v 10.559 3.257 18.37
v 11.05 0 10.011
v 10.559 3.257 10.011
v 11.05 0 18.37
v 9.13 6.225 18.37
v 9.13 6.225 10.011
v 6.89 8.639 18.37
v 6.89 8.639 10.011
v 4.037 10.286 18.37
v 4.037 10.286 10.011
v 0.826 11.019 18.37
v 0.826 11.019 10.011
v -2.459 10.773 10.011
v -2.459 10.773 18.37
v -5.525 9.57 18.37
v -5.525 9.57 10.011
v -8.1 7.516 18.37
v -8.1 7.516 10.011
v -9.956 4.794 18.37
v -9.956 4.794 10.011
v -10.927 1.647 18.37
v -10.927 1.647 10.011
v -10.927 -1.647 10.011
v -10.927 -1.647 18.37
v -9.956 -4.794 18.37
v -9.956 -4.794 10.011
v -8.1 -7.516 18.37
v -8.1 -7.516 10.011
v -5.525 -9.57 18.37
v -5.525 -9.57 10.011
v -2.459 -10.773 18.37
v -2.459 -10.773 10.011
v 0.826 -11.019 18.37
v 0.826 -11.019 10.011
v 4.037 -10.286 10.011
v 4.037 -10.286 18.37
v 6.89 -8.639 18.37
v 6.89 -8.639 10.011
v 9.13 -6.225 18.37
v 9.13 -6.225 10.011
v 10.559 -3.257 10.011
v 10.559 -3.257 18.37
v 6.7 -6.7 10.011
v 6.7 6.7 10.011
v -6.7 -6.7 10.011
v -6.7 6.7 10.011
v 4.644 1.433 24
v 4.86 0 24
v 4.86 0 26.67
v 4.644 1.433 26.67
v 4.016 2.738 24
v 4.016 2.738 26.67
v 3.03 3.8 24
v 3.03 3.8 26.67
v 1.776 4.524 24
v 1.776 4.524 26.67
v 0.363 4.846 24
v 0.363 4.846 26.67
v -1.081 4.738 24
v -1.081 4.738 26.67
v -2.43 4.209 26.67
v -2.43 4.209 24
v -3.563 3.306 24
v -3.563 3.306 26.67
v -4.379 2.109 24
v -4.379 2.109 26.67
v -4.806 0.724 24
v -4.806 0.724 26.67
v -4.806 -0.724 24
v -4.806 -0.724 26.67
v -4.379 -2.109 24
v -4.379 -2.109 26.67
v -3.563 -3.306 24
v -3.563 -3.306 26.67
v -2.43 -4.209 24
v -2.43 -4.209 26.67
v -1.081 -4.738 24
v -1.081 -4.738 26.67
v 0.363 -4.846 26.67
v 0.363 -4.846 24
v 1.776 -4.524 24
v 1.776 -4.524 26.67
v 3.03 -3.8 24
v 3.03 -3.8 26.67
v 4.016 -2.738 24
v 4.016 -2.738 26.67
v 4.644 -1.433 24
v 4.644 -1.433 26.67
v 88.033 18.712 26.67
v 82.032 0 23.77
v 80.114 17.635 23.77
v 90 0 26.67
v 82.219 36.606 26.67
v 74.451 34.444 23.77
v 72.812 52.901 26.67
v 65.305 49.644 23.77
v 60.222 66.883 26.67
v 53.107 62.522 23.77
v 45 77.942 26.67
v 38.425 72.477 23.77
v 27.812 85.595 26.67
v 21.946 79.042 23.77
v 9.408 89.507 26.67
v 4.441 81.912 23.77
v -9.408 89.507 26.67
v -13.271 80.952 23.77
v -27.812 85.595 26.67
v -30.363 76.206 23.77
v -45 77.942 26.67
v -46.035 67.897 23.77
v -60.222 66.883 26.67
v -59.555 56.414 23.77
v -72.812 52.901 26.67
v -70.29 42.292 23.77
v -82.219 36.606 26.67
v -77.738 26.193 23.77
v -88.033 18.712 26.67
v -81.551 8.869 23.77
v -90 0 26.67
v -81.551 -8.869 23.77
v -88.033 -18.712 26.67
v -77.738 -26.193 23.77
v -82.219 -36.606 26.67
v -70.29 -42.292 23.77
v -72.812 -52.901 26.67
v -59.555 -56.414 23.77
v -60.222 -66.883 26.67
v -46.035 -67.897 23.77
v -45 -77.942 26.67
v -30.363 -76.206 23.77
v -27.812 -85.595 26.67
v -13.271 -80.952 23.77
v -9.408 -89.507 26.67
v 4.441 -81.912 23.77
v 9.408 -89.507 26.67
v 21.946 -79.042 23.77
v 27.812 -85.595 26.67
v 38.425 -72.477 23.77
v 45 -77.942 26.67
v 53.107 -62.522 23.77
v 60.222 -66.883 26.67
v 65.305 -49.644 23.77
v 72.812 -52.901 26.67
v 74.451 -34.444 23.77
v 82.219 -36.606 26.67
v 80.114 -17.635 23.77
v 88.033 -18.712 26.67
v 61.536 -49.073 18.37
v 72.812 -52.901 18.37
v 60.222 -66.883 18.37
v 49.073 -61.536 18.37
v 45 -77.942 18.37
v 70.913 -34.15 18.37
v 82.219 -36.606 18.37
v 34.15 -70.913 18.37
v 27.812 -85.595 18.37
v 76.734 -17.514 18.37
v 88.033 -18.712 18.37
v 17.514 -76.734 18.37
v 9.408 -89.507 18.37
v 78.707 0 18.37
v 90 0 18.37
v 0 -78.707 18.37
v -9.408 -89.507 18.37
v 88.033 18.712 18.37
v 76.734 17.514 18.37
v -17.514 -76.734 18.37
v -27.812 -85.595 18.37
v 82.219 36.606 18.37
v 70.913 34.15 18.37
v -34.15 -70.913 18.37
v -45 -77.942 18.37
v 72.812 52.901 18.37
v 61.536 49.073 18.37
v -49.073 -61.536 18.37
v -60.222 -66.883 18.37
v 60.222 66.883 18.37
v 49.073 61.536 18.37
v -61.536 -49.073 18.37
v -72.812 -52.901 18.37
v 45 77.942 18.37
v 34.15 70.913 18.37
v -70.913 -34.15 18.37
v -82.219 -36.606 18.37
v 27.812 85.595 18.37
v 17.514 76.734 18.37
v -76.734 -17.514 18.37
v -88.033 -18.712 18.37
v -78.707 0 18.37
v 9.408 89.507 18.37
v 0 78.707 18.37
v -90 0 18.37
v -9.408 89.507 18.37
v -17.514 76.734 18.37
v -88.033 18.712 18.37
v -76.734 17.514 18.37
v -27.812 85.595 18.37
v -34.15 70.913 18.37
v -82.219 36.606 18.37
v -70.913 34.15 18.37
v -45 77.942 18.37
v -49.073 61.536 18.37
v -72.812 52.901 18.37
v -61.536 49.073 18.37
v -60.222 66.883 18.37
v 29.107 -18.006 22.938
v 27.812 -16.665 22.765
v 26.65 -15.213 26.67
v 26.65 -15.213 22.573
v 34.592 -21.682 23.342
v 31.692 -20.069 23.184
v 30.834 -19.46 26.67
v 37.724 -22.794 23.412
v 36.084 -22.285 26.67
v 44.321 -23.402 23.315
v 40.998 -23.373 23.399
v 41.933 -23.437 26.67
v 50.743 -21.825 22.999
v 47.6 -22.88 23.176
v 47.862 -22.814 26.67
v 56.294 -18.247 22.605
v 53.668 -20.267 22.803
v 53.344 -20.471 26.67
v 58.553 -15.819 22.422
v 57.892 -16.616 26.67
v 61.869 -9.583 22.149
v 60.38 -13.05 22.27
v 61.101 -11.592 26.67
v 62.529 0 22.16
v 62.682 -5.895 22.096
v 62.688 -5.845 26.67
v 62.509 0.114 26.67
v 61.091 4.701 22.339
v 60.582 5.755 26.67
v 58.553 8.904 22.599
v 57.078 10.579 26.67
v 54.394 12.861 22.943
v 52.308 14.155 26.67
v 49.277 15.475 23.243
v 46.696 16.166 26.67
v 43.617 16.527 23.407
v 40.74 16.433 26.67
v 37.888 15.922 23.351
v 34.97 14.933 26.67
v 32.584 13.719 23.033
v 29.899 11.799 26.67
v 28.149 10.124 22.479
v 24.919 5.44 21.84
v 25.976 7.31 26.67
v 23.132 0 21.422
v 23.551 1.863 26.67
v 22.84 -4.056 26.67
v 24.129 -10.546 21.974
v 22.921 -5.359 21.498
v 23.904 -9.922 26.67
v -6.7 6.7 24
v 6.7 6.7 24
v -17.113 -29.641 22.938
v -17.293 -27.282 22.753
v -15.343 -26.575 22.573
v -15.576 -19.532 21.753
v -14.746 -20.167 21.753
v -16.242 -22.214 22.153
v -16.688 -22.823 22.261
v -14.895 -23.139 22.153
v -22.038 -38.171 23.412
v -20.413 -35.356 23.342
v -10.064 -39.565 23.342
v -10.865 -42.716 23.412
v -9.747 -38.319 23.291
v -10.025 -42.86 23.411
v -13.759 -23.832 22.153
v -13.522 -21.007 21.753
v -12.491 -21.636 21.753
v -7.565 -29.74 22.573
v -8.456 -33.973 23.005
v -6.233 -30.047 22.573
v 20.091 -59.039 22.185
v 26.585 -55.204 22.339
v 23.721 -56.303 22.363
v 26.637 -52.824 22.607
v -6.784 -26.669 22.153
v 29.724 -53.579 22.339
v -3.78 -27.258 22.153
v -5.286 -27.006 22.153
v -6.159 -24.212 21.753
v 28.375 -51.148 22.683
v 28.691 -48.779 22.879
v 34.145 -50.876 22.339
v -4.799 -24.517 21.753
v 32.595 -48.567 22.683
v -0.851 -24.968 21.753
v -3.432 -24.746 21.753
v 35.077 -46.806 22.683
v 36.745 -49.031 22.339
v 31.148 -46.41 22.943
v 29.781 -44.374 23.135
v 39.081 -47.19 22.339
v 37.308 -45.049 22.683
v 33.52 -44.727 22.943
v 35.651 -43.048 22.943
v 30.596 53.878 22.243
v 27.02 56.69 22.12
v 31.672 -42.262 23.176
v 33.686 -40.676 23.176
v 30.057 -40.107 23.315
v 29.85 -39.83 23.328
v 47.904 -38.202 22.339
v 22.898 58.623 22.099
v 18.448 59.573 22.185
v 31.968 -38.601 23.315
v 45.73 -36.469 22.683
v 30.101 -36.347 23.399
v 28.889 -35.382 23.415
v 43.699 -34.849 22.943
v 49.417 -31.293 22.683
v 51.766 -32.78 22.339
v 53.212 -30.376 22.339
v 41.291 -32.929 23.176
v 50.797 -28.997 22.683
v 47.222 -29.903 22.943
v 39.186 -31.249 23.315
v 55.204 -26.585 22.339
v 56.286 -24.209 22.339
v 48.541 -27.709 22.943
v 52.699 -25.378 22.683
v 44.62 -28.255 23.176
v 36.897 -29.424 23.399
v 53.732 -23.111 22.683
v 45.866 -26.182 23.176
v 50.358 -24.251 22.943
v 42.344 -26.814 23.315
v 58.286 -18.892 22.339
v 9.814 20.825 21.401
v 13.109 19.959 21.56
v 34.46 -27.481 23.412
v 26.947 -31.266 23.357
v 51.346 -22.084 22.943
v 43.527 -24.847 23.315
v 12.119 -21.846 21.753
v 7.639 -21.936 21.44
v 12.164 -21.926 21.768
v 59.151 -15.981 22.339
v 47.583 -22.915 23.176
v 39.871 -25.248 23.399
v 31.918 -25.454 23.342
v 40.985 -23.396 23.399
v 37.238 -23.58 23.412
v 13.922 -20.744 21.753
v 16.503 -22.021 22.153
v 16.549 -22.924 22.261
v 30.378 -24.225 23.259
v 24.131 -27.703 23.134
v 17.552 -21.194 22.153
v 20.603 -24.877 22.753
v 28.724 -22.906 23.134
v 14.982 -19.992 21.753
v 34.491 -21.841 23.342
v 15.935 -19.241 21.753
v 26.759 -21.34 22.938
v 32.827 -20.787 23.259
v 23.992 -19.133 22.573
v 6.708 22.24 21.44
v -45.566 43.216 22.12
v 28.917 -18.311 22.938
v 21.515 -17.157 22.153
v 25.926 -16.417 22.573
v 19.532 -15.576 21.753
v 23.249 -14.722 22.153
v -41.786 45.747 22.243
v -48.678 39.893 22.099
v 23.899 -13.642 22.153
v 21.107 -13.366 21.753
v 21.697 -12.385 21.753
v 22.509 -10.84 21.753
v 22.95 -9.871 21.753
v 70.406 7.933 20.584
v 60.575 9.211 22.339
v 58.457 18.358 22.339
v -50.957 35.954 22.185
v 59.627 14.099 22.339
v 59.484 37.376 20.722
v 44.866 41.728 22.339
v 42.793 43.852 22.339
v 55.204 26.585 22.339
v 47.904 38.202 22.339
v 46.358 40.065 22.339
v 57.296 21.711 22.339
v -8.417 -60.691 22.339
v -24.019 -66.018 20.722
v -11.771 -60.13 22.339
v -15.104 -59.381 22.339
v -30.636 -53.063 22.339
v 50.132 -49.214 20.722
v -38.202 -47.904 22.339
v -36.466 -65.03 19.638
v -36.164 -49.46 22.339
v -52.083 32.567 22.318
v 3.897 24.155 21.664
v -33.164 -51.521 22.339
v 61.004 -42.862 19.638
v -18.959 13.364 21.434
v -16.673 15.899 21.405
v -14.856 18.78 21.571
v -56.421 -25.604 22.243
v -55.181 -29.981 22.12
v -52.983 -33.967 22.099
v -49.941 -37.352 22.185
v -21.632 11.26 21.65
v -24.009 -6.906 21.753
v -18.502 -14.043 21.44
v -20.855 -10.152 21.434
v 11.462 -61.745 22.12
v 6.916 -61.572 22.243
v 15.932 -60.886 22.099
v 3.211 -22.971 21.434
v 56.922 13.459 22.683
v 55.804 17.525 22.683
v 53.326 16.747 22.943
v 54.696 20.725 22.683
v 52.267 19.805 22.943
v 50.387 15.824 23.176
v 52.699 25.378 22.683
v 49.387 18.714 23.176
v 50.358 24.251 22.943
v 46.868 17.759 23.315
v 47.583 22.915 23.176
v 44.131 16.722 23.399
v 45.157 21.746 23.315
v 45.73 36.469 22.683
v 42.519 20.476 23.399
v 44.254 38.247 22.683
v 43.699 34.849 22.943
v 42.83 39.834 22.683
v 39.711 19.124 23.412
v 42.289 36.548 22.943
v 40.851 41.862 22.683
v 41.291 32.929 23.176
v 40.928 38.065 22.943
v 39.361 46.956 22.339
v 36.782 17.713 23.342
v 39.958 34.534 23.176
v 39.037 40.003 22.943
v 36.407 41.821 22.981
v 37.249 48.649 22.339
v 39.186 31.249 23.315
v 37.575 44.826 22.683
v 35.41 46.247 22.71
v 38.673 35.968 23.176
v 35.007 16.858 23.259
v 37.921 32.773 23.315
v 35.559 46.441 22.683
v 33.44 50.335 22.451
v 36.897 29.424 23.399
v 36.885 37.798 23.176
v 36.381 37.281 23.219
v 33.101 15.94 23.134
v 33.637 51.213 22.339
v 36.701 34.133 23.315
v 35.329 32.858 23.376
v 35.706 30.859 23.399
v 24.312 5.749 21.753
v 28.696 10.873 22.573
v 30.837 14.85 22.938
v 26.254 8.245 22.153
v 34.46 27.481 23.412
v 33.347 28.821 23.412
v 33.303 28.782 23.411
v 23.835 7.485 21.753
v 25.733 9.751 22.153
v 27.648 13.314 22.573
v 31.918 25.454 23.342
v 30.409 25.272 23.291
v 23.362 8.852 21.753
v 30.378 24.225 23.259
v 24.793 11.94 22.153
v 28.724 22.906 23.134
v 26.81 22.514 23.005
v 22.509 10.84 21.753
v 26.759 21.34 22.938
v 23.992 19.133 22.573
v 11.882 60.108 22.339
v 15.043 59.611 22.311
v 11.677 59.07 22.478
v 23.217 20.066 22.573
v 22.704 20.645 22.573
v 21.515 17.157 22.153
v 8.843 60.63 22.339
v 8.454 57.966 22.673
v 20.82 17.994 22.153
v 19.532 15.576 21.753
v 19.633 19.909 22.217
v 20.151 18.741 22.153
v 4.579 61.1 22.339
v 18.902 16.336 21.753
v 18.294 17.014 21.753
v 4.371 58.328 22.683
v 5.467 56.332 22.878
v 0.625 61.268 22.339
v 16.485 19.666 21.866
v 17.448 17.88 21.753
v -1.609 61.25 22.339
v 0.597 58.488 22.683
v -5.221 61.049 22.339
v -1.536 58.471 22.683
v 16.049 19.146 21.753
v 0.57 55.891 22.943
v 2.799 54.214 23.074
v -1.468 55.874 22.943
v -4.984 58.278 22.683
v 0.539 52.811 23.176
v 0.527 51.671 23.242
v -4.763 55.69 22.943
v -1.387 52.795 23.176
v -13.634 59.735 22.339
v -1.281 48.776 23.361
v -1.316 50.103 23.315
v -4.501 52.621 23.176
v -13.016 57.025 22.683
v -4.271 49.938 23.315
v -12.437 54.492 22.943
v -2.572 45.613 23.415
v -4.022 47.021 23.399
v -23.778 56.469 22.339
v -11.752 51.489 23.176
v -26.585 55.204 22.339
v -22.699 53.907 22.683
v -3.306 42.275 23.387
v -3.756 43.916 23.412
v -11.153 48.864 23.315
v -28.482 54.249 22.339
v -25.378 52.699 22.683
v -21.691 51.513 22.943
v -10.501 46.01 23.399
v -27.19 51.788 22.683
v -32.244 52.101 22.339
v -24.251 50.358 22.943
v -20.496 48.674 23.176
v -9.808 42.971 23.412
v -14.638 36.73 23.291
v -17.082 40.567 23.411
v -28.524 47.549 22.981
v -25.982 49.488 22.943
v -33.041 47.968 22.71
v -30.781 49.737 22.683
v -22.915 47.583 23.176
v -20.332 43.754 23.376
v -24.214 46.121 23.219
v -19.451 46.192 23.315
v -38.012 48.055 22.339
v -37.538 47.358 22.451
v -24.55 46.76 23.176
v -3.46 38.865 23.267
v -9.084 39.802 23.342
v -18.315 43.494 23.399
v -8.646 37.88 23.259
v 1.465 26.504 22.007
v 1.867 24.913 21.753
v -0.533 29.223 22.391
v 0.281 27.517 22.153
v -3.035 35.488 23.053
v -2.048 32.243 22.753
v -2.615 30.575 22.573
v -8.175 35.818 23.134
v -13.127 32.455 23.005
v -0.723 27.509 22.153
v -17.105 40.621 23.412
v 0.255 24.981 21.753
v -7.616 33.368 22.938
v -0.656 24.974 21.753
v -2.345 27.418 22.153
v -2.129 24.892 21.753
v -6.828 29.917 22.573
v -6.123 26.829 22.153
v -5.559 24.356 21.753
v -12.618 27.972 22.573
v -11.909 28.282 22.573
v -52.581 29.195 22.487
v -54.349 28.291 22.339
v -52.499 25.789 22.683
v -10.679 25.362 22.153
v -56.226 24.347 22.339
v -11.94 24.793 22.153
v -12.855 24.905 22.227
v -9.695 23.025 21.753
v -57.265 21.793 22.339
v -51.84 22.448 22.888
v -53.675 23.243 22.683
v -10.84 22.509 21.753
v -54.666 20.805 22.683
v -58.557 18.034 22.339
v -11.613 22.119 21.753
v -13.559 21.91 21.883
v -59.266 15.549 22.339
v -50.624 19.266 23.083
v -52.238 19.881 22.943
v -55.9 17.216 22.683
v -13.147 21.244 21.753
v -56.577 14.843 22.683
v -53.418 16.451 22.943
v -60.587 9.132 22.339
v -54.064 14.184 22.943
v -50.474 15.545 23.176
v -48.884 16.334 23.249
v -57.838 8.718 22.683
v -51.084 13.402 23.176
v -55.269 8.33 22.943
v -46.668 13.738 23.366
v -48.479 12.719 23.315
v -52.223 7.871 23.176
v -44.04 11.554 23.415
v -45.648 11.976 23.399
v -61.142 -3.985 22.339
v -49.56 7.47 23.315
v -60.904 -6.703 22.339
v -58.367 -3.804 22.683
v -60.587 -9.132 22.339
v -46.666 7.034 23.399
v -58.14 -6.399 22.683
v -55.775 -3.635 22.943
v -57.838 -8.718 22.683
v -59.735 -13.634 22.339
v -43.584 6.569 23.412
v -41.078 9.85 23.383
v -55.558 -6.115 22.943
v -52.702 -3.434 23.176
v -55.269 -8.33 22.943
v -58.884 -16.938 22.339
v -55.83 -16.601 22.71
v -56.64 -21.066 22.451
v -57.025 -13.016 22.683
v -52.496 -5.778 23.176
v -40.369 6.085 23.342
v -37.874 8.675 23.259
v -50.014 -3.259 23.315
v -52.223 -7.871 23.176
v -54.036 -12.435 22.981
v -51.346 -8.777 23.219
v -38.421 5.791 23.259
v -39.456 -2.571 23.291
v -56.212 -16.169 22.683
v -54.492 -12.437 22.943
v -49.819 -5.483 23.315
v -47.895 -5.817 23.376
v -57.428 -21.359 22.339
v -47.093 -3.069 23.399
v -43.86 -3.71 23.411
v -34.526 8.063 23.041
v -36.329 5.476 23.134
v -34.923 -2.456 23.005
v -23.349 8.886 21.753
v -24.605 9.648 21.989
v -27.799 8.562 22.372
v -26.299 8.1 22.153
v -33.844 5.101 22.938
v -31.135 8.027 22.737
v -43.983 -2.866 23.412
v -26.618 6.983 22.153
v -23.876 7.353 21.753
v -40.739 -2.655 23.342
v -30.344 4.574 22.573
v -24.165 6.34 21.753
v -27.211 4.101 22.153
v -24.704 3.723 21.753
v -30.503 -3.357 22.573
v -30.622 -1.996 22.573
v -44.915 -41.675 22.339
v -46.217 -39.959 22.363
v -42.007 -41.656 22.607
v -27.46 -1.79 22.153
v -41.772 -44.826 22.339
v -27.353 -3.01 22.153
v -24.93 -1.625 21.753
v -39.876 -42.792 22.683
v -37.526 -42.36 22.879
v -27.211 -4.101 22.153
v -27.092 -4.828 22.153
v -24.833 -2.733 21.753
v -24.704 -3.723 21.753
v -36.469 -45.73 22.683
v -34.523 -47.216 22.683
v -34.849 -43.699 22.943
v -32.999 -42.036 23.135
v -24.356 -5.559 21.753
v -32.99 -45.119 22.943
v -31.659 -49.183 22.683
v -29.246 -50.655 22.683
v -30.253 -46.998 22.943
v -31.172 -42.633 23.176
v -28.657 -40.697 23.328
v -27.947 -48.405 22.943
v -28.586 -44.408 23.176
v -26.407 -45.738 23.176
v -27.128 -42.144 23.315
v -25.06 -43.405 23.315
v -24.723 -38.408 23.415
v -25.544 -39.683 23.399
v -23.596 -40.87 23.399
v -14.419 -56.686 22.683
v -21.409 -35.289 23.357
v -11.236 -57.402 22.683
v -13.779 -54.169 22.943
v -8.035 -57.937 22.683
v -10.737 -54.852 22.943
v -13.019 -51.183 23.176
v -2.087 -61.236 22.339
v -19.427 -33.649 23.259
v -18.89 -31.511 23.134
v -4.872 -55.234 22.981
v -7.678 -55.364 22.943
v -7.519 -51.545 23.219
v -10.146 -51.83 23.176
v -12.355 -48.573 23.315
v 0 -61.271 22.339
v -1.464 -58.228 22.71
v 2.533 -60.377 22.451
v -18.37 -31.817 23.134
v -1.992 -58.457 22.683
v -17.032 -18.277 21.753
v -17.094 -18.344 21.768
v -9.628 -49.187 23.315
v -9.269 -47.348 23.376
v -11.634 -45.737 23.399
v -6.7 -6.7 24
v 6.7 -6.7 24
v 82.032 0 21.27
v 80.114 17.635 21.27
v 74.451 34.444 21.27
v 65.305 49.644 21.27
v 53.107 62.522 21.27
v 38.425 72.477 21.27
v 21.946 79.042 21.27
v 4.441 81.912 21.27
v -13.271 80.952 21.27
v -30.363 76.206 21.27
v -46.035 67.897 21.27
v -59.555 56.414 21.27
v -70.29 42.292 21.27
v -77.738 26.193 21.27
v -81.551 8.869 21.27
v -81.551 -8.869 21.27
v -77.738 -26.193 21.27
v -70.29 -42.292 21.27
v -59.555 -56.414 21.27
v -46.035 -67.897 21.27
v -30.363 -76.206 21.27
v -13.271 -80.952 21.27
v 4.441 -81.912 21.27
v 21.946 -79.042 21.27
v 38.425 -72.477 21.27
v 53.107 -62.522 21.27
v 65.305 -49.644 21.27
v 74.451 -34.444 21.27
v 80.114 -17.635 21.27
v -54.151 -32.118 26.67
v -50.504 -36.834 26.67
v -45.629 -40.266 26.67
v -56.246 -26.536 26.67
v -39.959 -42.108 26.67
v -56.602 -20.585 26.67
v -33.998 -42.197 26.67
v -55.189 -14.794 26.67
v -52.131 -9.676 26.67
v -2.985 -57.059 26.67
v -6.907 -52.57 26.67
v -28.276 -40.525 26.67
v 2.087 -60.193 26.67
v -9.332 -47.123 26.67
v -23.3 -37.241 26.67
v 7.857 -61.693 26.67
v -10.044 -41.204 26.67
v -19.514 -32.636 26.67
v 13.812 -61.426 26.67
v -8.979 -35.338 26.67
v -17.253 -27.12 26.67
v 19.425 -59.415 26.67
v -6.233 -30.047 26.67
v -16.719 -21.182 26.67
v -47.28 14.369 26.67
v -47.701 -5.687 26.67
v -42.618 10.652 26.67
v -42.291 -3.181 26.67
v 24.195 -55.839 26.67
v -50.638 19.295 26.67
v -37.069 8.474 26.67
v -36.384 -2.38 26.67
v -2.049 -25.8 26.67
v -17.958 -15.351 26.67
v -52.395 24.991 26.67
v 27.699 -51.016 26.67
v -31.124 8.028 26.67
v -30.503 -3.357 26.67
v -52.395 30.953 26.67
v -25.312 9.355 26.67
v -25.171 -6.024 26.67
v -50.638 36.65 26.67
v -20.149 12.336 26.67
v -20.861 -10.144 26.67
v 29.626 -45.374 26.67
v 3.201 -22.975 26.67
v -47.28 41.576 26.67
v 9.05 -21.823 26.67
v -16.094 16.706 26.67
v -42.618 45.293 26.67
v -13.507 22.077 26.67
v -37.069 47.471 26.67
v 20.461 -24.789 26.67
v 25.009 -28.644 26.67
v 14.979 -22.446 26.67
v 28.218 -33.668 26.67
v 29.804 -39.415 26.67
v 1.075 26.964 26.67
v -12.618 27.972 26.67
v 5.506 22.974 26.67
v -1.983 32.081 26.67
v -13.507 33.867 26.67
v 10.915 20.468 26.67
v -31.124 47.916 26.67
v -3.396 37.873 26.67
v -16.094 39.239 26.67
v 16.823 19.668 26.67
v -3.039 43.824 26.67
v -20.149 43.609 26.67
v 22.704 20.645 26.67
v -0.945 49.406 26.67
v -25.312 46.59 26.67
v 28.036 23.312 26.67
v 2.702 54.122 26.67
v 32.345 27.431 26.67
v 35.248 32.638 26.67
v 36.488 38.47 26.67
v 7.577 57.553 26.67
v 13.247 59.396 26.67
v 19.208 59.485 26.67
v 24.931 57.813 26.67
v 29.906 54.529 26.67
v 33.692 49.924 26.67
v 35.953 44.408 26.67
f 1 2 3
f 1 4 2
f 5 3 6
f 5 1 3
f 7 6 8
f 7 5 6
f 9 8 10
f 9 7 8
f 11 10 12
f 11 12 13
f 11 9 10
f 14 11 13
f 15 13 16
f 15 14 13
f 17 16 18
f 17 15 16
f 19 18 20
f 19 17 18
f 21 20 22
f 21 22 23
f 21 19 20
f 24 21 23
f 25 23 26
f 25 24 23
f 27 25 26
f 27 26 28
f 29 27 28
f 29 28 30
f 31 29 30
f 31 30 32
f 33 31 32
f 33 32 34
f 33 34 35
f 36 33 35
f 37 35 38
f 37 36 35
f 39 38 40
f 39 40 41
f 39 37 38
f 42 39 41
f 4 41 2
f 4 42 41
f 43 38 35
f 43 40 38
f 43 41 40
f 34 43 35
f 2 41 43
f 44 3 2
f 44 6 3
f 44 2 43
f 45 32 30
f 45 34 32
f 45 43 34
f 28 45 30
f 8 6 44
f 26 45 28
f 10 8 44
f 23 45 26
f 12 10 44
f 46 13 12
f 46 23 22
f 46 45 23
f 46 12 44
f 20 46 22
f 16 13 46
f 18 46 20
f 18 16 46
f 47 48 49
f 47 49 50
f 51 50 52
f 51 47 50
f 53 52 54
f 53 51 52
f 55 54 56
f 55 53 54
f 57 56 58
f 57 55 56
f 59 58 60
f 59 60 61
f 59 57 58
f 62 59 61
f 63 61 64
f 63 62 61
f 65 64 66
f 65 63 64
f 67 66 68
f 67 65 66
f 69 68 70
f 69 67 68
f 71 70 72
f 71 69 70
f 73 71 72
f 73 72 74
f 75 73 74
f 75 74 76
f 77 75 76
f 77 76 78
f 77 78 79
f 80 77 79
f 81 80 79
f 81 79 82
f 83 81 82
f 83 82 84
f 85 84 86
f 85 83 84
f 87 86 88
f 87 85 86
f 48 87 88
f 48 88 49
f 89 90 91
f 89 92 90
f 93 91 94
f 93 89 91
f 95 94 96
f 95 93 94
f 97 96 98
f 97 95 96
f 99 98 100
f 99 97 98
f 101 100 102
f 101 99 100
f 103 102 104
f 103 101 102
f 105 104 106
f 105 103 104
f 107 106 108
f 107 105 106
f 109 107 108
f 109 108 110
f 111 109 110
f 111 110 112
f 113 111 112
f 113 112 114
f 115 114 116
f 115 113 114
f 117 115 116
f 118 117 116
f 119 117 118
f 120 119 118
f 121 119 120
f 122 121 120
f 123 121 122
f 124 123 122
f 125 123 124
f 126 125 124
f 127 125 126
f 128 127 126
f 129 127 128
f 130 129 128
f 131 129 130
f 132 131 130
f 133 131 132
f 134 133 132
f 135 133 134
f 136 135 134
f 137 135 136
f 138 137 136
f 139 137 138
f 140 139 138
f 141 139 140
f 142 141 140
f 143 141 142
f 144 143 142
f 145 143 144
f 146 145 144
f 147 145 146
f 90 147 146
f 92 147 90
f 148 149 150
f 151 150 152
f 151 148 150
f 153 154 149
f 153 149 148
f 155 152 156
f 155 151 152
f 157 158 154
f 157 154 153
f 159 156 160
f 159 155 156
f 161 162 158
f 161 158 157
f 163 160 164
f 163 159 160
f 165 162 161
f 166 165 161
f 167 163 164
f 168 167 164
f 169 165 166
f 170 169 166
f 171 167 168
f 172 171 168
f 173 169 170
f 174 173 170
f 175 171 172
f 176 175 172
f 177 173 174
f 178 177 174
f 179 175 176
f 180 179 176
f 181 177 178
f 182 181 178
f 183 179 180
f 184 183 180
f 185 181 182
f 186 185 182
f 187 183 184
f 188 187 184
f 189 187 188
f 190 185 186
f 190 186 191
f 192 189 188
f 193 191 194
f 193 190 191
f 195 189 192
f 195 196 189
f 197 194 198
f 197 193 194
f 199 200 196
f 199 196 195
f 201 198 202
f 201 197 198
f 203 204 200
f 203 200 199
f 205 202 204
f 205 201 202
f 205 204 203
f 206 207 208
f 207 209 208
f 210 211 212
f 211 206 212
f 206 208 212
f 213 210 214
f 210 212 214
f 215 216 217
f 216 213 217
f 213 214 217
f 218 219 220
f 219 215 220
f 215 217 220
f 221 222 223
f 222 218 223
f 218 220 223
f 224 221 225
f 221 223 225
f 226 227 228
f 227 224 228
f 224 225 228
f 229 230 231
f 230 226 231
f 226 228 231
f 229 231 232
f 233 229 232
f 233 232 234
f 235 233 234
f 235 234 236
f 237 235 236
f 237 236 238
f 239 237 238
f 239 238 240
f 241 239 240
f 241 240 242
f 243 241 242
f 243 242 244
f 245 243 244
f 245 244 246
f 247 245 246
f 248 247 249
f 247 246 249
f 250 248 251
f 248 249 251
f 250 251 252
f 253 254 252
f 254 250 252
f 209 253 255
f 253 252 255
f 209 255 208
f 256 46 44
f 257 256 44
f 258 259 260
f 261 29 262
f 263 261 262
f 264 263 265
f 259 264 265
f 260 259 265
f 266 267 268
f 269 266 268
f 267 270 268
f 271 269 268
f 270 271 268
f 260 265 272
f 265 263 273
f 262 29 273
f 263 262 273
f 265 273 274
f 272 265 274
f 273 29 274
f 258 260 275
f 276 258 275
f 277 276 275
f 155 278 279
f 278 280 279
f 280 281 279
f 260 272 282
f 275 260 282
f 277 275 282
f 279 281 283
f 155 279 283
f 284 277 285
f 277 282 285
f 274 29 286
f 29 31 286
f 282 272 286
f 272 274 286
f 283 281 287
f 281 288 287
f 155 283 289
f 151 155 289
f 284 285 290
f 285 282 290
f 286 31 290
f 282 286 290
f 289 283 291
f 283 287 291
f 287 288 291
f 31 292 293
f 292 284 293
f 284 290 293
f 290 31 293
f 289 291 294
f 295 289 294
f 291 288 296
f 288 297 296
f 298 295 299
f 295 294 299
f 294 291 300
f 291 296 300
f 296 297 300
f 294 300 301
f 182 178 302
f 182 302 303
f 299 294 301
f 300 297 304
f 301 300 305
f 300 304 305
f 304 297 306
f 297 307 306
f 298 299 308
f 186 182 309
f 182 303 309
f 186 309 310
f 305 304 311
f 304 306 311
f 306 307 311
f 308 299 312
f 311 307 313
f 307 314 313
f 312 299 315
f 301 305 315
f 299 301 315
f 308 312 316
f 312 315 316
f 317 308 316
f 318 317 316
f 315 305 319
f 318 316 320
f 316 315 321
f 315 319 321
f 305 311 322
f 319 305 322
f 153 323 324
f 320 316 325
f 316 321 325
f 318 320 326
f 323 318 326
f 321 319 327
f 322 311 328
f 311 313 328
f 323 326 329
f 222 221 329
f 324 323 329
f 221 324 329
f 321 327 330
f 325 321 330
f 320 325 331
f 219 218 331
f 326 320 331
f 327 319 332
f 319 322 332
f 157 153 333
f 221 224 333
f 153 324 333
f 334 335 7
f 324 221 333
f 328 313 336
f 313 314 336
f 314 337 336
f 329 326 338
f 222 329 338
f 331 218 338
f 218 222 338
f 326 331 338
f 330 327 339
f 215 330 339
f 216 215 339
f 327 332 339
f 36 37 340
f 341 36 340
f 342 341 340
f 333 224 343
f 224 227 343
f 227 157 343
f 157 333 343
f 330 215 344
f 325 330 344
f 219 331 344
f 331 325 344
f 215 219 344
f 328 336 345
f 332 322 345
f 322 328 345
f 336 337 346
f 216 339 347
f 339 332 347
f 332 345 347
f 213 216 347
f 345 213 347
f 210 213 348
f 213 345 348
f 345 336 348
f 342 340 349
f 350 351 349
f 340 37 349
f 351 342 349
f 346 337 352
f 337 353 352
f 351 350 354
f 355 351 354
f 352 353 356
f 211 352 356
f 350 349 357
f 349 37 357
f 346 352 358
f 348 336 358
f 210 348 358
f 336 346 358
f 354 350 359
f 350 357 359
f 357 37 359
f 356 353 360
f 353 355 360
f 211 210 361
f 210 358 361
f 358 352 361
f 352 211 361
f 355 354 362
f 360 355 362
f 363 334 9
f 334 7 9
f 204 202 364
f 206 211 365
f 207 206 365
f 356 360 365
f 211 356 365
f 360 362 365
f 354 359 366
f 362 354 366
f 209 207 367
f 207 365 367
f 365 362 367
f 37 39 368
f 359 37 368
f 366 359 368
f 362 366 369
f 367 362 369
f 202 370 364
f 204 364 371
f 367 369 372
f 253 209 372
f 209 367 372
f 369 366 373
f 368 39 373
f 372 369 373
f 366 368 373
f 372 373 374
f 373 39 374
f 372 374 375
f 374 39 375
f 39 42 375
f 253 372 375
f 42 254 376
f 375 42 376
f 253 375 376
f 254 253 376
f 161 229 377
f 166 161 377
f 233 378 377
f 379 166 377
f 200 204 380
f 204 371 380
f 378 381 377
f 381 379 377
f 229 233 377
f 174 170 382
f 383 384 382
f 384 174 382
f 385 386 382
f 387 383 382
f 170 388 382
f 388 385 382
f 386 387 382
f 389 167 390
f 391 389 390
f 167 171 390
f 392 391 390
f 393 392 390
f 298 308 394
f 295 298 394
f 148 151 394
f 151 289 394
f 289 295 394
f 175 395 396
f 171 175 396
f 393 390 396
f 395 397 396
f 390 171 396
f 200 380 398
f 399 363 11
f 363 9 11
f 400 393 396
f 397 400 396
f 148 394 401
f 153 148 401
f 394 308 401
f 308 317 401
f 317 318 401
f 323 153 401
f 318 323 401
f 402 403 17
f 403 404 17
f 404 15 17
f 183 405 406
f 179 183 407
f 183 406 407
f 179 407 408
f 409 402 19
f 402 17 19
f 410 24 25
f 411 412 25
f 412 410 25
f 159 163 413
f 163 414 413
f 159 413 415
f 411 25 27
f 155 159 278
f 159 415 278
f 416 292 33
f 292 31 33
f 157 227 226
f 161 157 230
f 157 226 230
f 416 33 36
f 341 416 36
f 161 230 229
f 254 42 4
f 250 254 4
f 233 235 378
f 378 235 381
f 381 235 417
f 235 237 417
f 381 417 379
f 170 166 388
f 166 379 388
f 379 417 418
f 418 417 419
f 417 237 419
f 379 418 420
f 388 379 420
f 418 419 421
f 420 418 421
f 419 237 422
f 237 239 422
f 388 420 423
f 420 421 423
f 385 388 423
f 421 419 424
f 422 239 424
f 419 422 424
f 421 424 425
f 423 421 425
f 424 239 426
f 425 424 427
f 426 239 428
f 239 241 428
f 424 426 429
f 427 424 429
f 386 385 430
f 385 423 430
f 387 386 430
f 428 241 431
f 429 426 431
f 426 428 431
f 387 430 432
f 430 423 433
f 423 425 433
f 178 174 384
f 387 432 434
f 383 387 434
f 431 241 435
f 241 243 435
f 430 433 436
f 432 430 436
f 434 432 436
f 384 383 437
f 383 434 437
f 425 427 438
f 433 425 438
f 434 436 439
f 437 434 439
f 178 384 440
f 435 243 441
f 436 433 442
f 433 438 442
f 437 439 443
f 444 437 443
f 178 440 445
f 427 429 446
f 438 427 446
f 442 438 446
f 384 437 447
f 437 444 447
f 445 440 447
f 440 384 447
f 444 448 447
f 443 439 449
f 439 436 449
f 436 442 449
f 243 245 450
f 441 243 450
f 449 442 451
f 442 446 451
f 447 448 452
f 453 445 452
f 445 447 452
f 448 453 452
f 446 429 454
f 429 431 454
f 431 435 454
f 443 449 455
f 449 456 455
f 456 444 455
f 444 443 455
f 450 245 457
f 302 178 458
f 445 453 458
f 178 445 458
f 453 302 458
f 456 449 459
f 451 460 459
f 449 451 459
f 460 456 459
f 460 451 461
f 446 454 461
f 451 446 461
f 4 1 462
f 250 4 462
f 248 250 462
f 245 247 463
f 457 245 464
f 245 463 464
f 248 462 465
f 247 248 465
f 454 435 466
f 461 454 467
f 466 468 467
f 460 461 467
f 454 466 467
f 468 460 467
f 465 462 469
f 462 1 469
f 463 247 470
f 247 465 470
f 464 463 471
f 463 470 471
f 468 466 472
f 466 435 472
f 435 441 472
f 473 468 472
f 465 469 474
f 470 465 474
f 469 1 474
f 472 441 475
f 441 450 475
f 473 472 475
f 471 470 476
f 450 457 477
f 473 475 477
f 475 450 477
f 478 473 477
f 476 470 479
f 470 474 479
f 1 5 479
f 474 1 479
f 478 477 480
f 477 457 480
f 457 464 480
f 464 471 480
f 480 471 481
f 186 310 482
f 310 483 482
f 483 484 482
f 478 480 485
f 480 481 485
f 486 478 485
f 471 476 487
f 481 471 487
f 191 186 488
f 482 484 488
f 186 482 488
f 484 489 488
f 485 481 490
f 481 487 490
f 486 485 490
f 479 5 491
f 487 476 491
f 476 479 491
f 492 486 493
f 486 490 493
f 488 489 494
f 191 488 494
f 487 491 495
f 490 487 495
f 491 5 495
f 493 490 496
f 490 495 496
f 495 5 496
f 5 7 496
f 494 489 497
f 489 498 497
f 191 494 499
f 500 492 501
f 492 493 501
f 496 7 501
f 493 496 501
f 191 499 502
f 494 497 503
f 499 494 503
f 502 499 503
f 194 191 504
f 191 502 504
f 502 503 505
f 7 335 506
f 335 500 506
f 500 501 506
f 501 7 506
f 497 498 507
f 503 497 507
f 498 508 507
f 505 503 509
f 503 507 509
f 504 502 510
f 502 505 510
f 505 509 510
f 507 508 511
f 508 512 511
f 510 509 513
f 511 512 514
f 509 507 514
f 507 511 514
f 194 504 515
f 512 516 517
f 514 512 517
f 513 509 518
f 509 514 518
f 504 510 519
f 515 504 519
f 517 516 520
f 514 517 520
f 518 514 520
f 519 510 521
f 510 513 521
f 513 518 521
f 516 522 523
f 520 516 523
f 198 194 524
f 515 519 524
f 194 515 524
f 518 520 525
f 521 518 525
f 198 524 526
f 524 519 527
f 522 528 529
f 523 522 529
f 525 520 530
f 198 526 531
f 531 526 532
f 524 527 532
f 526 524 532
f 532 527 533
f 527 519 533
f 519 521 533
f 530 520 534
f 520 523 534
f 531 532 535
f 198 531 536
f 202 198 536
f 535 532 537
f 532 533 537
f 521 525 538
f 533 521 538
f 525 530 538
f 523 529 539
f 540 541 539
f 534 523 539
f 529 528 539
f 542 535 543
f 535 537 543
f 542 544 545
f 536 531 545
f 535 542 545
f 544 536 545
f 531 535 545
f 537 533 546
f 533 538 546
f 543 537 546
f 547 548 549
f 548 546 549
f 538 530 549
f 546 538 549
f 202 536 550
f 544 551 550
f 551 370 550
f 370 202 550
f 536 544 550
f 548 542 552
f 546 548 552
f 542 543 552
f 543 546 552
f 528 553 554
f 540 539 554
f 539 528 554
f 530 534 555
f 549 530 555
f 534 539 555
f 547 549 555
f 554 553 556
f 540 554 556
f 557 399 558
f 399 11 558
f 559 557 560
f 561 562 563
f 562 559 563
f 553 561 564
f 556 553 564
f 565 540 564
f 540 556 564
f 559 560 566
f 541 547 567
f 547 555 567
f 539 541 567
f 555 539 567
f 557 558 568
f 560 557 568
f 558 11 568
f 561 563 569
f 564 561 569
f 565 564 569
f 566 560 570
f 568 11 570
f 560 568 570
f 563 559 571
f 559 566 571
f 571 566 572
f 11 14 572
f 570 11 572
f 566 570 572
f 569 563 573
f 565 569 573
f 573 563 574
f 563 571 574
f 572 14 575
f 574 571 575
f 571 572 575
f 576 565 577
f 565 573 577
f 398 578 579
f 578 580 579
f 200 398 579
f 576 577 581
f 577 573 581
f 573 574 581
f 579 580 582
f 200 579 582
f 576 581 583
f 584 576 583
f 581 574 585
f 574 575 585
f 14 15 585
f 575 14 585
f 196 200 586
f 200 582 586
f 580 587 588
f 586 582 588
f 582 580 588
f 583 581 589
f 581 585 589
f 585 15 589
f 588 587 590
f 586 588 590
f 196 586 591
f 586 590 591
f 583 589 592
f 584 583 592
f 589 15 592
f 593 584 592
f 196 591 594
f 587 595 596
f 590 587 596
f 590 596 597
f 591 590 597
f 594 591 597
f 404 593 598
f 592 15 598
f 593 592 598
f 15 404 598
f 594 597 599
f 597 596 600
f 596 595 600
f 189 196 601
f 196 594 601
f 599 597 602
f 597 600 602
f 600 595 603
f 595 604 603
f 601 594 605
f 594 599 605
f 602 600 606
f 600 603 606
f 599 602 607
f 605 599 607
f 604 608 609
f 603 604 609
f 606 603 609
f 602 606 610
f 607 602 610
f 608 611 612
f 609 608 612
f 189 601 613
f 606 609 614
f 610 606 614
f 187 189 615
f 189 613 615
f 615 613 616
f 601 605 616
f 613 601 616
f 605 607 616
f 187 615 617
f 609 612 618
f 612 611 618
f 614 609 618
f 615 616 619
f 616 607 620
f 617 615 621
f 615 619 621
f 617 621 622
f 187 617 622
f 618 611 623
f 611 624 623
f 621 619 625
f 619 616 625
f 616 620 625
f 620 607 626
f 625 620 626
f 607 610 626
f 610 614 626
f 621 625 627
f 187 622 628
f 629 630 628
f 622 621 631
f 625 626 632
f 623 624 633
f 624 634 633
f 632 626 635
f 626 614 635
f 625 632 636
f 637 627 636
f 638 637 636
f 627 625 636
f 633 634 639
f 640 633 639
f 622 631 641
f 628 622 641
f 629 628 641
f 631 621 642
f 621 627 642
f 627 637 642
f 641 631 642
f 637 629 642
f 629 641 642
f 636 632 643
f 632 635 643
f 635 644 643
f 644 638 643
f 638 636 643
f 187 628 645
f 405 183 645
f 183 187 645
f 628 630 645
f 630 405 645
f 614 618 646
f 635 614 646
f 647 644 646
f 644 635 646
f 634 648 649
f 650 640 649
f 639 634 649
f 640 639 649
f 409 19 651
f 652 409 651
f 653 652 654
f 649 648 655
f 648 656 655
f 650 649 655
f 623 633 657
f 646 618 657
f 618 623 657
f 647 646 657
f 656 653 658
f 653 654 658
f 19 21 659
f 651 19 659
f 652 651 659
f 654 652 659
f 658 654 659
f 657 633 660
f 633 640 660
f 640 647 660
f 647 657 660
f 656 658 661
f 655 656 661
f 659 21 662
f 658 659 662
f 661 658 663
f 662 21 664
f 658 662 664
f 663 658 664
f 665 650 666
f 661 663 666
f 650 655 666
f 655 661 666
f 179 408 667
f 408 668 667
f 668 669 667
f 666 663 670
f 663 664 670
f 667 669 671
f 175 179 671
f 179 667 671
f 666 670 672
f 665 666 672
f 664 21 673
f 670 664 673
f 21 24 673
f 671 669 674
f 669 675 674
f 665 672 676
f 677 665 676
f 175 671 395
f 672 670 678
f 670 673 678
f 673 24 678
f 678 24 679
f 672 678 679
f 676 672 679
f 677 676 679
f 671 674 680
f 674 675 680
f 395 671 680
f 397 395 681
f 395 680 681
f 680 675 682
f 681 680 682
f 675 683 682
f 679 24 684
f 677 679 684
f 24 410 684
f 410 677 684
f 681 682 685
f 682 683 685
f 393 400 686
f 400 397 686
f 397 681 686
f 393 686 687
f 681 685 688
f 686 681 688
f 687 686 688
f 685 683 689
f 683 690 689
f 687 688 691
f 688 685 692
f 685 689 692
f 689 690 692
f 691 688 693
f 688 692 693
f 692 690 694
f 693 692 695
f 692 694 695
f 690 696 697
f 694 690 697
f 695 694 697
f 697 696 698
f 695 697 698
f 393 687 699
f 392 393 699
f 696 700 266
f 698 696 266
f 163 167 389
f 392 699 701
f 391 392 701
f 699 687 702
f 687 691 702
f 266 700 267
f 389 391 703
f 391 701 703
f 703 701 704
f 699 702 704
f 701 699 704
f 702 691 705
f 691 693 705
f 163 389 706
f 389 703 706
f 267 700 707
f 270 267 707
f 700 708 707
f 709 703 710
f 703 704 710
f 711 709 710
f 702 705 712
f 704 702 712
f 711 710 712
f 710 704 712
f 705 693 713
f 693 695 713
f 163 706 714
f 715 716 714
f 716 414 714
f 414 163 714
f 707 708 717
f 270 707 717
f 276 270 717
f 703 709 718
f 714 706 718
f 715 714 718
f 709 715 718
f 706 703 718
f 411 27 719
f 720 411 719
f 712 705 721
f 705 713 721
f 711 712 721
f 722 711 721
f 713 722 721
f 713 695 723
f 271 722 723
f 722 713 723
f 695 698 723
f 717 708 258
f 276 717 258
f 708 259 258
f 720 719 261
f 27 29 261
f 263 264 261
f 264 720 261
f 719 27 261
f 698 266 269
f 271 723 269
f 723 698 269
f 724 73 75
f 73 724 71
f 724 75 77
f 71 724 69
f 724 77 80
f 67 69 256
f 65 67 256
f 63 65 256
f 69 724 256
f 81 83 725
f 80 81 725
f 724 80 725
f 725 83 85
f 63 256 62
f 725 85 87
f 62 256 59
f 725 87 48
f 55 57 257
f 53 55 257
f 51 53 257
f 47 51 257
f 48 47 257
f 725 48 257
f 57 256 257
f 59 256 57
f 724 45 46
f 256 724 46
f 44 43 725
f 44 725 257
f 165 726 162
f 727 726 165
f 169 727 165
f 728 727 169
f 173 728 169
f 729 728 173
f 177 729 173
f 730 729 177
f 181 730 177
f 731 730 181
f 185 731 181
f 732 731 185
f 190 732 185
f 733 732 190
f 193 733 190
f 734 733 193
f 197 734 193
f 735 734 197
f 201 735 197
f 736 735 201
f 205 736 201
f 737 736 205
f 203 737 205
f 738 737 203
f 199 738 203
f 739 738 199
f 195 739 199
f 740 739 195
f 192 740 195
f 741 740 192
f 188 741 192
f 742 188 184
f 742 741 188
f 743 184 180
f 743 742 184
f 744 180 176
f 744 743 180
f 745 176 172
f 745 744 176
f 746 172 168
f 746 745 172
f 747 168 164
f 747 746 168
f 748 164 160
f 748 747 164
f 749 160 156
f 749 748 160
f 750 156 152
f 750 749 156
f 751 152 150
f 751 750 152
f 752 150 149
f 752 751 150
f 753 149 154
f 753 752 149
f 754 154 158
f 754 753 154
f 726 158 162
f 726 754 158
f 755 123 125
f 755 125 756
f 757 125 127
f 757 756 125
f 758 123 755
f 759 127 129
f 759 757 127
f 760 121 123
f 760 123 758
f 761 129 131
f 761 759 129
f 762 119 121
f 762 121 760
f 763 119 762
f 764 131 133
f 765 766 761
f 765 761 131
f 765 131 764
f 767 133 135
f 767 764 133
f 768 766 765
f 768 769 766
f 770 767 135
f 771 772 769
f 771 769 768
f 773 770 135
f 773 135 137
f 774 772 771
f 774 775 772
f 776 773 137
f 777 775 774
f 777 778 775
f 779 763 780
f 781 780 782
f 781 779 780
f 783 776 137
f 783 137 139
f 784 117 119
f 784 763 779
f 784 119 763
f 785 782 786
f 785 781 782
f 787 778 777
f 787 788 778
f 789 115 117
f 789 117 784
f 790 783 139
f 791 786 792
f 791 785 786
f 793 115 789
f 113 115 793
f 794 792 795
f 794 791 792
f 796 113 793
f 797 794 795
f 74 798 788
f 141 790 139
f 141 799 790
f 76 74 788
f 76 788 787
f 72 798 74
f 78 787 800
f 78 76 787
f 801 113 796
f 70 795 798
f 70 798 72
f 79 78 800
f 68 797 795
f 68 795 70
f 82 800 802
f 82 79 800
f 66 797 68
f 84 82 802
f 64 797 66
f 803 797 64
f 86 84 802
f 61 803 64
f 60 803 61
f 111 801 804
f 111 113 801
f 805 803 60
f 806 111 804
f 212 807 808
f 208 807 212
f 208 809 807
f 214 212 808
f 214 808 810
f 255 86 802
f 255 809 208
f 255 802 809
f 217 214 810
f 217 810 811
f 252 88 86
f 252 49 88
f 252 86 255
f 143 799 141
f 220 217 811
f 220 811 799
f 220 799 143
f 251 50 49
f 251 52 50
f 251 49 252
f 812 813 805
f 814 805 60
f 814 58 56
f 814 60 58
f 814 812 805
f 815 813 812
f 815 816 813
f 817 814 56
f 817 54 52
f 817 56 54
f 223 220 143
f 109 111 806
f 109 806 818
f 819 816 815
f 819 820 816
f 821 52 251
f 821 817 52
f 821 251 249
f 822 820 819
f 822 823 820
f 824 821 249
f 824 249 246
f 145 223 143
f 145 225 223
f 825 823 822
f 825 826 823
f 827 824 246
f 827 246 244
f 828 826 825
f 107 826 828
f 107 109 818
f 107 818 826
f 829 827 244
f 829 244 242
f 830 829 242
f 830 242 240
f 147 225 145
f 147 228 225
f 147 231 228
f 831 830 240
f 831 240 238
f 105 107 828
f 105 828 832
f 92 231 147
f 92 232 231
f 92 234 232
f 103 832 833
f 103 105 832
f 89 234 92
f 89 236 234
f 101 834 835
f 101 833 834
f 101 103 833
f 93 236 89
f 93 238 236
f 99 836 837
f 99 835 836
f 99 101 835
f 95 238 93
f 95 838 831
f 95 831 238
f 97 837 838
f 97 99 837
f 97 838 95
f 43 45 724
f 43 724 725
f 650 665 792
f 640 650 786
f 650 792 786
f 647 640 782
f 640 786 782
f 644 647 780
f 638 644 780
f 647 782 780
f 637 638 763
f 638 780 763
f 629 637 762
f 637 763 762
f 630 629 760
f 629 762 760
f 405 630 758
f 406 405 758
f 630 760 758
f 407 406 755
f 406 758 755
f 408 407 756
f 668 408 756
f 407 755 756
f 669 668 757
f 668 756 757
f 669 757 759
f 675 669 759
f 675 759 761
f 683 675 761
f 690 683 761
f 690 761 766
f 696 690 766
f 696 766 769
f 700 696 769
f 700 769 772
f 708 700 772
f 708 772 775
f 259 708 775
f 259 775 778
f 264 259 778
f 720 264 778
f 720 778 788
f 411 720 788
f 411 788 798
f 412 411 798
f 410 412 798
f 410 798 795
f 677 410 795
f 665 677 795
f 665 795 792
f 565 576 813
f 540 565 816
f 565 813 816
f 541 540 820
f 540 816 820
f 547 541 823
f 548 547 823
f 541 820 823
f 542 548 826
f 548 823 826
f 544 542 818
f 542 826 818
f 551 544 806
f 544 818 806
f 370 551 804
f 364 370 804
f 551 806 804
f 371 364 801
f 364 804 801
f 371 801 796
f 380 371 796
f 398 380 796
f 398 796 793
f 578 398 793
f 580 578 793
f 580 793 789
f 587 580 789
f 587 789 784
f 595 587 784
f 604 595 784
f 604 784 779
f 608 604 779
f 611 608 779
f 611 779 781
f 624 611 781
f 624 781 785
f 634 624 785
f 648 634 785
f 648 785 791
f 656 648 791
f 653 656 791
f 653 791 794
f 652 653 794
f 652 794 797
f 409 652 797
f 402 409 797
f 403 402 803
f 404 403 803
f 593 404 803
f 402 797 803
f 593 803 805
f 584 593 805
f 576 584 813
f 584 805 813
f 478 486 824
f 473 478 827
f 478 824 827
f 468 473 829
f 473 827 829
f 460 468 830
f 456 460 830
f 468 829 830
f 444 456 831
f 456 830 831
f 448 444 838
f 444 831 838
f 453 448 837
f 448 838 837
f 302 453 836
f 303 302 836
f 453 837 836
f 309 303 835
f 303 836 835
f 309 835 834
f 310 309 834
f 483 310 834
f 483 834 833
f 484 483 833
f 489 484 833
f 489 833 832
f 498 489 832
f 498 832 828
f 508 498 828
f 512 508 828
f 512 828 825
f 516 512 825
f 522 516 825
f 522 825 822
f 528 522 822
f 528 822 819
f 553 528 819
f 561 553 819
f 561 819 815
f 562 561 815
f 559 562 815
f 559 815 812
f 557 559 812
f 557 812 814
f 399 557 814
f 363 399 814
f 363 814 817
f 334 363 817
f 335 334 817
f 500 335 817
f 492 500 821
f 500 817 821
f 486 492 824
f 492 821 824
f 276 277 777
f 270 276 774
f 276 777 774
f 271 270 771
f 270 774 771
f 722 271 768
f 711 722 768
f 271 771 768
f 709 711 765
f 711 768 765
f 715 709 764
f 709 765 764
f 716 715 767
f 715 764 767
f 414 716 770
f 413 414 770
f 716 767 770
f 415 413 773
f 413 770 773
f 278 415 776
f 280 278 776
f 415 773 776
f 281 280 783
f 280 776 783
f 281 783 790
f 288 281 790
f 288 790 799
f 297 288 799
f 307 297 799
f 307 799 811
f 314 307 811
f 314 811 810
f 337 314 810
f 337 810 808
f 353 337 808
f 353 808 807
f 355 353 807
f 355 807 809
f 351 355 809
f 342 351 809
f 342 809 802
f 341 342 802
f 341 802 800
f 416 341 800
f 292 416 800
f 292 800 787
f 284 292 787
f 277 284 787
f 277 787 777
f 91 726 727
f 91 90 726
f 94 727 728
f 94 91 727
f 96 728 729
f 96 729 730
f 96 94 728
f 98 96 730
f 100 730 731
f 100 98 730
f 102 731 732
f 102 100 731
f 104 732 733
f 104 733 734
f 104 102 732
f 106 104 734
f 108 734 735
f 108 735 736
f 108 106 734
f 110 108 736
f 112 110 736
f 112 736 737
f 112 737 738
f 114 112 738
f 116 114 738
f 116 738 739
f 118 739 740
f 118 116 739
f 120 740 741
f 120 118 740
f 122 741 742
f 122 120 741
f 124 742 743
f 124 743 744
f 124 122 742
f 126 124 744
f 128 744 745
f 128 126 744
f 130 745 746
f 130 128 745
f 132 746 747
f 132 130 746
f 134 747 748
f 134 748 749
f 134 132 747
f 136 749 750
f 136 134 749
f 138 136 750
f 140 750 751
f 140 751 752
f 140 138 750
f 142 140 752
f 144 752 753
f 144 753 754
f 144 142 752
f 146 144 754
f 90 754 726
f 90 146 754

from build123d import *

# Parameters (mm, degrees)
BOX_W              = 13.4
BOX_H              = 13.4
BOX_DEPTH          = 14
SKETCH001_R        = 20
POCKET_DEPTH       = 6
POLARPATTERN_COUNT = 5


with BuildPart() as cube:
    # Box → Box (new body)
    with BuildSketch(Plane(origin=(-6.7, -6.7, 10), x_dir=(1, 0, 0), z_dir=(0, 0, 1))):
        with Locations((6.7, 6.7)):
            Rectangle(BOX_W, BOX_H)
    extrude(amount=BOX_DEPTH)


with BuildPart() as body:
    # Sketch → Revolve (revolve)
    with BuildSketch(Plane.XZ):
        with BuildLine():
            Line((78.70723, 18.37), (90, 18.37))
            Line((90, 18.37), (82.032315, 21.27))
            Line((82.032315, 21.27), (82.032315, 23.77))
            Line((82.032315, 23.77), (90, 26.67))
            Line((90, 26.67), (4.86, 26.67))
            Line((4.86, 26.67), (4.86, 10.010664))
            Line((4.86, 10.010664), (11.05, 10.010664))
            Line((11.05, 10.010664), (11.05, 18.37))
            add(Edge.make_bspline(
                [(78.70723, 18.37), (58.452015, 25.146616), (31.574902, 25.049244), (11.05, 18.37)],
                knots=[0, 0, 0, 0, 1, 1, 1, 1], degree=3))
        make_face()
    revolve(axis=Axis((0, 0, 0), (0, 0, 1)))

    # Cut: cut Cube
    add(cube.part, mode=Mode.SUBTRACT)

    # Sketch001 (on Face12 of BaseFeature) → Pocket (cut)
    with BuildSketch(Plane.XY.offset(26.67)):
        with Locations((-32.618477, 27.97224)):
            Circle(SKETCH001_R)
    pocket = extrude(amount=-POCKET_DEPTH, mode=Mode.SUBTRACT)

    # PolarPattern: Pocket ×5 about axis
    polarpattern_axis = Axis((0, 0, 26.67), (0, 0, 1))
    for i in range(1, POLARPATTERN_COUNT):
        add(pocket.rotate(polarpattern_axis, i * 360 / POLARPATTERN_COUNT), mode=Mode.SUBTRACT)


solid = body.part
